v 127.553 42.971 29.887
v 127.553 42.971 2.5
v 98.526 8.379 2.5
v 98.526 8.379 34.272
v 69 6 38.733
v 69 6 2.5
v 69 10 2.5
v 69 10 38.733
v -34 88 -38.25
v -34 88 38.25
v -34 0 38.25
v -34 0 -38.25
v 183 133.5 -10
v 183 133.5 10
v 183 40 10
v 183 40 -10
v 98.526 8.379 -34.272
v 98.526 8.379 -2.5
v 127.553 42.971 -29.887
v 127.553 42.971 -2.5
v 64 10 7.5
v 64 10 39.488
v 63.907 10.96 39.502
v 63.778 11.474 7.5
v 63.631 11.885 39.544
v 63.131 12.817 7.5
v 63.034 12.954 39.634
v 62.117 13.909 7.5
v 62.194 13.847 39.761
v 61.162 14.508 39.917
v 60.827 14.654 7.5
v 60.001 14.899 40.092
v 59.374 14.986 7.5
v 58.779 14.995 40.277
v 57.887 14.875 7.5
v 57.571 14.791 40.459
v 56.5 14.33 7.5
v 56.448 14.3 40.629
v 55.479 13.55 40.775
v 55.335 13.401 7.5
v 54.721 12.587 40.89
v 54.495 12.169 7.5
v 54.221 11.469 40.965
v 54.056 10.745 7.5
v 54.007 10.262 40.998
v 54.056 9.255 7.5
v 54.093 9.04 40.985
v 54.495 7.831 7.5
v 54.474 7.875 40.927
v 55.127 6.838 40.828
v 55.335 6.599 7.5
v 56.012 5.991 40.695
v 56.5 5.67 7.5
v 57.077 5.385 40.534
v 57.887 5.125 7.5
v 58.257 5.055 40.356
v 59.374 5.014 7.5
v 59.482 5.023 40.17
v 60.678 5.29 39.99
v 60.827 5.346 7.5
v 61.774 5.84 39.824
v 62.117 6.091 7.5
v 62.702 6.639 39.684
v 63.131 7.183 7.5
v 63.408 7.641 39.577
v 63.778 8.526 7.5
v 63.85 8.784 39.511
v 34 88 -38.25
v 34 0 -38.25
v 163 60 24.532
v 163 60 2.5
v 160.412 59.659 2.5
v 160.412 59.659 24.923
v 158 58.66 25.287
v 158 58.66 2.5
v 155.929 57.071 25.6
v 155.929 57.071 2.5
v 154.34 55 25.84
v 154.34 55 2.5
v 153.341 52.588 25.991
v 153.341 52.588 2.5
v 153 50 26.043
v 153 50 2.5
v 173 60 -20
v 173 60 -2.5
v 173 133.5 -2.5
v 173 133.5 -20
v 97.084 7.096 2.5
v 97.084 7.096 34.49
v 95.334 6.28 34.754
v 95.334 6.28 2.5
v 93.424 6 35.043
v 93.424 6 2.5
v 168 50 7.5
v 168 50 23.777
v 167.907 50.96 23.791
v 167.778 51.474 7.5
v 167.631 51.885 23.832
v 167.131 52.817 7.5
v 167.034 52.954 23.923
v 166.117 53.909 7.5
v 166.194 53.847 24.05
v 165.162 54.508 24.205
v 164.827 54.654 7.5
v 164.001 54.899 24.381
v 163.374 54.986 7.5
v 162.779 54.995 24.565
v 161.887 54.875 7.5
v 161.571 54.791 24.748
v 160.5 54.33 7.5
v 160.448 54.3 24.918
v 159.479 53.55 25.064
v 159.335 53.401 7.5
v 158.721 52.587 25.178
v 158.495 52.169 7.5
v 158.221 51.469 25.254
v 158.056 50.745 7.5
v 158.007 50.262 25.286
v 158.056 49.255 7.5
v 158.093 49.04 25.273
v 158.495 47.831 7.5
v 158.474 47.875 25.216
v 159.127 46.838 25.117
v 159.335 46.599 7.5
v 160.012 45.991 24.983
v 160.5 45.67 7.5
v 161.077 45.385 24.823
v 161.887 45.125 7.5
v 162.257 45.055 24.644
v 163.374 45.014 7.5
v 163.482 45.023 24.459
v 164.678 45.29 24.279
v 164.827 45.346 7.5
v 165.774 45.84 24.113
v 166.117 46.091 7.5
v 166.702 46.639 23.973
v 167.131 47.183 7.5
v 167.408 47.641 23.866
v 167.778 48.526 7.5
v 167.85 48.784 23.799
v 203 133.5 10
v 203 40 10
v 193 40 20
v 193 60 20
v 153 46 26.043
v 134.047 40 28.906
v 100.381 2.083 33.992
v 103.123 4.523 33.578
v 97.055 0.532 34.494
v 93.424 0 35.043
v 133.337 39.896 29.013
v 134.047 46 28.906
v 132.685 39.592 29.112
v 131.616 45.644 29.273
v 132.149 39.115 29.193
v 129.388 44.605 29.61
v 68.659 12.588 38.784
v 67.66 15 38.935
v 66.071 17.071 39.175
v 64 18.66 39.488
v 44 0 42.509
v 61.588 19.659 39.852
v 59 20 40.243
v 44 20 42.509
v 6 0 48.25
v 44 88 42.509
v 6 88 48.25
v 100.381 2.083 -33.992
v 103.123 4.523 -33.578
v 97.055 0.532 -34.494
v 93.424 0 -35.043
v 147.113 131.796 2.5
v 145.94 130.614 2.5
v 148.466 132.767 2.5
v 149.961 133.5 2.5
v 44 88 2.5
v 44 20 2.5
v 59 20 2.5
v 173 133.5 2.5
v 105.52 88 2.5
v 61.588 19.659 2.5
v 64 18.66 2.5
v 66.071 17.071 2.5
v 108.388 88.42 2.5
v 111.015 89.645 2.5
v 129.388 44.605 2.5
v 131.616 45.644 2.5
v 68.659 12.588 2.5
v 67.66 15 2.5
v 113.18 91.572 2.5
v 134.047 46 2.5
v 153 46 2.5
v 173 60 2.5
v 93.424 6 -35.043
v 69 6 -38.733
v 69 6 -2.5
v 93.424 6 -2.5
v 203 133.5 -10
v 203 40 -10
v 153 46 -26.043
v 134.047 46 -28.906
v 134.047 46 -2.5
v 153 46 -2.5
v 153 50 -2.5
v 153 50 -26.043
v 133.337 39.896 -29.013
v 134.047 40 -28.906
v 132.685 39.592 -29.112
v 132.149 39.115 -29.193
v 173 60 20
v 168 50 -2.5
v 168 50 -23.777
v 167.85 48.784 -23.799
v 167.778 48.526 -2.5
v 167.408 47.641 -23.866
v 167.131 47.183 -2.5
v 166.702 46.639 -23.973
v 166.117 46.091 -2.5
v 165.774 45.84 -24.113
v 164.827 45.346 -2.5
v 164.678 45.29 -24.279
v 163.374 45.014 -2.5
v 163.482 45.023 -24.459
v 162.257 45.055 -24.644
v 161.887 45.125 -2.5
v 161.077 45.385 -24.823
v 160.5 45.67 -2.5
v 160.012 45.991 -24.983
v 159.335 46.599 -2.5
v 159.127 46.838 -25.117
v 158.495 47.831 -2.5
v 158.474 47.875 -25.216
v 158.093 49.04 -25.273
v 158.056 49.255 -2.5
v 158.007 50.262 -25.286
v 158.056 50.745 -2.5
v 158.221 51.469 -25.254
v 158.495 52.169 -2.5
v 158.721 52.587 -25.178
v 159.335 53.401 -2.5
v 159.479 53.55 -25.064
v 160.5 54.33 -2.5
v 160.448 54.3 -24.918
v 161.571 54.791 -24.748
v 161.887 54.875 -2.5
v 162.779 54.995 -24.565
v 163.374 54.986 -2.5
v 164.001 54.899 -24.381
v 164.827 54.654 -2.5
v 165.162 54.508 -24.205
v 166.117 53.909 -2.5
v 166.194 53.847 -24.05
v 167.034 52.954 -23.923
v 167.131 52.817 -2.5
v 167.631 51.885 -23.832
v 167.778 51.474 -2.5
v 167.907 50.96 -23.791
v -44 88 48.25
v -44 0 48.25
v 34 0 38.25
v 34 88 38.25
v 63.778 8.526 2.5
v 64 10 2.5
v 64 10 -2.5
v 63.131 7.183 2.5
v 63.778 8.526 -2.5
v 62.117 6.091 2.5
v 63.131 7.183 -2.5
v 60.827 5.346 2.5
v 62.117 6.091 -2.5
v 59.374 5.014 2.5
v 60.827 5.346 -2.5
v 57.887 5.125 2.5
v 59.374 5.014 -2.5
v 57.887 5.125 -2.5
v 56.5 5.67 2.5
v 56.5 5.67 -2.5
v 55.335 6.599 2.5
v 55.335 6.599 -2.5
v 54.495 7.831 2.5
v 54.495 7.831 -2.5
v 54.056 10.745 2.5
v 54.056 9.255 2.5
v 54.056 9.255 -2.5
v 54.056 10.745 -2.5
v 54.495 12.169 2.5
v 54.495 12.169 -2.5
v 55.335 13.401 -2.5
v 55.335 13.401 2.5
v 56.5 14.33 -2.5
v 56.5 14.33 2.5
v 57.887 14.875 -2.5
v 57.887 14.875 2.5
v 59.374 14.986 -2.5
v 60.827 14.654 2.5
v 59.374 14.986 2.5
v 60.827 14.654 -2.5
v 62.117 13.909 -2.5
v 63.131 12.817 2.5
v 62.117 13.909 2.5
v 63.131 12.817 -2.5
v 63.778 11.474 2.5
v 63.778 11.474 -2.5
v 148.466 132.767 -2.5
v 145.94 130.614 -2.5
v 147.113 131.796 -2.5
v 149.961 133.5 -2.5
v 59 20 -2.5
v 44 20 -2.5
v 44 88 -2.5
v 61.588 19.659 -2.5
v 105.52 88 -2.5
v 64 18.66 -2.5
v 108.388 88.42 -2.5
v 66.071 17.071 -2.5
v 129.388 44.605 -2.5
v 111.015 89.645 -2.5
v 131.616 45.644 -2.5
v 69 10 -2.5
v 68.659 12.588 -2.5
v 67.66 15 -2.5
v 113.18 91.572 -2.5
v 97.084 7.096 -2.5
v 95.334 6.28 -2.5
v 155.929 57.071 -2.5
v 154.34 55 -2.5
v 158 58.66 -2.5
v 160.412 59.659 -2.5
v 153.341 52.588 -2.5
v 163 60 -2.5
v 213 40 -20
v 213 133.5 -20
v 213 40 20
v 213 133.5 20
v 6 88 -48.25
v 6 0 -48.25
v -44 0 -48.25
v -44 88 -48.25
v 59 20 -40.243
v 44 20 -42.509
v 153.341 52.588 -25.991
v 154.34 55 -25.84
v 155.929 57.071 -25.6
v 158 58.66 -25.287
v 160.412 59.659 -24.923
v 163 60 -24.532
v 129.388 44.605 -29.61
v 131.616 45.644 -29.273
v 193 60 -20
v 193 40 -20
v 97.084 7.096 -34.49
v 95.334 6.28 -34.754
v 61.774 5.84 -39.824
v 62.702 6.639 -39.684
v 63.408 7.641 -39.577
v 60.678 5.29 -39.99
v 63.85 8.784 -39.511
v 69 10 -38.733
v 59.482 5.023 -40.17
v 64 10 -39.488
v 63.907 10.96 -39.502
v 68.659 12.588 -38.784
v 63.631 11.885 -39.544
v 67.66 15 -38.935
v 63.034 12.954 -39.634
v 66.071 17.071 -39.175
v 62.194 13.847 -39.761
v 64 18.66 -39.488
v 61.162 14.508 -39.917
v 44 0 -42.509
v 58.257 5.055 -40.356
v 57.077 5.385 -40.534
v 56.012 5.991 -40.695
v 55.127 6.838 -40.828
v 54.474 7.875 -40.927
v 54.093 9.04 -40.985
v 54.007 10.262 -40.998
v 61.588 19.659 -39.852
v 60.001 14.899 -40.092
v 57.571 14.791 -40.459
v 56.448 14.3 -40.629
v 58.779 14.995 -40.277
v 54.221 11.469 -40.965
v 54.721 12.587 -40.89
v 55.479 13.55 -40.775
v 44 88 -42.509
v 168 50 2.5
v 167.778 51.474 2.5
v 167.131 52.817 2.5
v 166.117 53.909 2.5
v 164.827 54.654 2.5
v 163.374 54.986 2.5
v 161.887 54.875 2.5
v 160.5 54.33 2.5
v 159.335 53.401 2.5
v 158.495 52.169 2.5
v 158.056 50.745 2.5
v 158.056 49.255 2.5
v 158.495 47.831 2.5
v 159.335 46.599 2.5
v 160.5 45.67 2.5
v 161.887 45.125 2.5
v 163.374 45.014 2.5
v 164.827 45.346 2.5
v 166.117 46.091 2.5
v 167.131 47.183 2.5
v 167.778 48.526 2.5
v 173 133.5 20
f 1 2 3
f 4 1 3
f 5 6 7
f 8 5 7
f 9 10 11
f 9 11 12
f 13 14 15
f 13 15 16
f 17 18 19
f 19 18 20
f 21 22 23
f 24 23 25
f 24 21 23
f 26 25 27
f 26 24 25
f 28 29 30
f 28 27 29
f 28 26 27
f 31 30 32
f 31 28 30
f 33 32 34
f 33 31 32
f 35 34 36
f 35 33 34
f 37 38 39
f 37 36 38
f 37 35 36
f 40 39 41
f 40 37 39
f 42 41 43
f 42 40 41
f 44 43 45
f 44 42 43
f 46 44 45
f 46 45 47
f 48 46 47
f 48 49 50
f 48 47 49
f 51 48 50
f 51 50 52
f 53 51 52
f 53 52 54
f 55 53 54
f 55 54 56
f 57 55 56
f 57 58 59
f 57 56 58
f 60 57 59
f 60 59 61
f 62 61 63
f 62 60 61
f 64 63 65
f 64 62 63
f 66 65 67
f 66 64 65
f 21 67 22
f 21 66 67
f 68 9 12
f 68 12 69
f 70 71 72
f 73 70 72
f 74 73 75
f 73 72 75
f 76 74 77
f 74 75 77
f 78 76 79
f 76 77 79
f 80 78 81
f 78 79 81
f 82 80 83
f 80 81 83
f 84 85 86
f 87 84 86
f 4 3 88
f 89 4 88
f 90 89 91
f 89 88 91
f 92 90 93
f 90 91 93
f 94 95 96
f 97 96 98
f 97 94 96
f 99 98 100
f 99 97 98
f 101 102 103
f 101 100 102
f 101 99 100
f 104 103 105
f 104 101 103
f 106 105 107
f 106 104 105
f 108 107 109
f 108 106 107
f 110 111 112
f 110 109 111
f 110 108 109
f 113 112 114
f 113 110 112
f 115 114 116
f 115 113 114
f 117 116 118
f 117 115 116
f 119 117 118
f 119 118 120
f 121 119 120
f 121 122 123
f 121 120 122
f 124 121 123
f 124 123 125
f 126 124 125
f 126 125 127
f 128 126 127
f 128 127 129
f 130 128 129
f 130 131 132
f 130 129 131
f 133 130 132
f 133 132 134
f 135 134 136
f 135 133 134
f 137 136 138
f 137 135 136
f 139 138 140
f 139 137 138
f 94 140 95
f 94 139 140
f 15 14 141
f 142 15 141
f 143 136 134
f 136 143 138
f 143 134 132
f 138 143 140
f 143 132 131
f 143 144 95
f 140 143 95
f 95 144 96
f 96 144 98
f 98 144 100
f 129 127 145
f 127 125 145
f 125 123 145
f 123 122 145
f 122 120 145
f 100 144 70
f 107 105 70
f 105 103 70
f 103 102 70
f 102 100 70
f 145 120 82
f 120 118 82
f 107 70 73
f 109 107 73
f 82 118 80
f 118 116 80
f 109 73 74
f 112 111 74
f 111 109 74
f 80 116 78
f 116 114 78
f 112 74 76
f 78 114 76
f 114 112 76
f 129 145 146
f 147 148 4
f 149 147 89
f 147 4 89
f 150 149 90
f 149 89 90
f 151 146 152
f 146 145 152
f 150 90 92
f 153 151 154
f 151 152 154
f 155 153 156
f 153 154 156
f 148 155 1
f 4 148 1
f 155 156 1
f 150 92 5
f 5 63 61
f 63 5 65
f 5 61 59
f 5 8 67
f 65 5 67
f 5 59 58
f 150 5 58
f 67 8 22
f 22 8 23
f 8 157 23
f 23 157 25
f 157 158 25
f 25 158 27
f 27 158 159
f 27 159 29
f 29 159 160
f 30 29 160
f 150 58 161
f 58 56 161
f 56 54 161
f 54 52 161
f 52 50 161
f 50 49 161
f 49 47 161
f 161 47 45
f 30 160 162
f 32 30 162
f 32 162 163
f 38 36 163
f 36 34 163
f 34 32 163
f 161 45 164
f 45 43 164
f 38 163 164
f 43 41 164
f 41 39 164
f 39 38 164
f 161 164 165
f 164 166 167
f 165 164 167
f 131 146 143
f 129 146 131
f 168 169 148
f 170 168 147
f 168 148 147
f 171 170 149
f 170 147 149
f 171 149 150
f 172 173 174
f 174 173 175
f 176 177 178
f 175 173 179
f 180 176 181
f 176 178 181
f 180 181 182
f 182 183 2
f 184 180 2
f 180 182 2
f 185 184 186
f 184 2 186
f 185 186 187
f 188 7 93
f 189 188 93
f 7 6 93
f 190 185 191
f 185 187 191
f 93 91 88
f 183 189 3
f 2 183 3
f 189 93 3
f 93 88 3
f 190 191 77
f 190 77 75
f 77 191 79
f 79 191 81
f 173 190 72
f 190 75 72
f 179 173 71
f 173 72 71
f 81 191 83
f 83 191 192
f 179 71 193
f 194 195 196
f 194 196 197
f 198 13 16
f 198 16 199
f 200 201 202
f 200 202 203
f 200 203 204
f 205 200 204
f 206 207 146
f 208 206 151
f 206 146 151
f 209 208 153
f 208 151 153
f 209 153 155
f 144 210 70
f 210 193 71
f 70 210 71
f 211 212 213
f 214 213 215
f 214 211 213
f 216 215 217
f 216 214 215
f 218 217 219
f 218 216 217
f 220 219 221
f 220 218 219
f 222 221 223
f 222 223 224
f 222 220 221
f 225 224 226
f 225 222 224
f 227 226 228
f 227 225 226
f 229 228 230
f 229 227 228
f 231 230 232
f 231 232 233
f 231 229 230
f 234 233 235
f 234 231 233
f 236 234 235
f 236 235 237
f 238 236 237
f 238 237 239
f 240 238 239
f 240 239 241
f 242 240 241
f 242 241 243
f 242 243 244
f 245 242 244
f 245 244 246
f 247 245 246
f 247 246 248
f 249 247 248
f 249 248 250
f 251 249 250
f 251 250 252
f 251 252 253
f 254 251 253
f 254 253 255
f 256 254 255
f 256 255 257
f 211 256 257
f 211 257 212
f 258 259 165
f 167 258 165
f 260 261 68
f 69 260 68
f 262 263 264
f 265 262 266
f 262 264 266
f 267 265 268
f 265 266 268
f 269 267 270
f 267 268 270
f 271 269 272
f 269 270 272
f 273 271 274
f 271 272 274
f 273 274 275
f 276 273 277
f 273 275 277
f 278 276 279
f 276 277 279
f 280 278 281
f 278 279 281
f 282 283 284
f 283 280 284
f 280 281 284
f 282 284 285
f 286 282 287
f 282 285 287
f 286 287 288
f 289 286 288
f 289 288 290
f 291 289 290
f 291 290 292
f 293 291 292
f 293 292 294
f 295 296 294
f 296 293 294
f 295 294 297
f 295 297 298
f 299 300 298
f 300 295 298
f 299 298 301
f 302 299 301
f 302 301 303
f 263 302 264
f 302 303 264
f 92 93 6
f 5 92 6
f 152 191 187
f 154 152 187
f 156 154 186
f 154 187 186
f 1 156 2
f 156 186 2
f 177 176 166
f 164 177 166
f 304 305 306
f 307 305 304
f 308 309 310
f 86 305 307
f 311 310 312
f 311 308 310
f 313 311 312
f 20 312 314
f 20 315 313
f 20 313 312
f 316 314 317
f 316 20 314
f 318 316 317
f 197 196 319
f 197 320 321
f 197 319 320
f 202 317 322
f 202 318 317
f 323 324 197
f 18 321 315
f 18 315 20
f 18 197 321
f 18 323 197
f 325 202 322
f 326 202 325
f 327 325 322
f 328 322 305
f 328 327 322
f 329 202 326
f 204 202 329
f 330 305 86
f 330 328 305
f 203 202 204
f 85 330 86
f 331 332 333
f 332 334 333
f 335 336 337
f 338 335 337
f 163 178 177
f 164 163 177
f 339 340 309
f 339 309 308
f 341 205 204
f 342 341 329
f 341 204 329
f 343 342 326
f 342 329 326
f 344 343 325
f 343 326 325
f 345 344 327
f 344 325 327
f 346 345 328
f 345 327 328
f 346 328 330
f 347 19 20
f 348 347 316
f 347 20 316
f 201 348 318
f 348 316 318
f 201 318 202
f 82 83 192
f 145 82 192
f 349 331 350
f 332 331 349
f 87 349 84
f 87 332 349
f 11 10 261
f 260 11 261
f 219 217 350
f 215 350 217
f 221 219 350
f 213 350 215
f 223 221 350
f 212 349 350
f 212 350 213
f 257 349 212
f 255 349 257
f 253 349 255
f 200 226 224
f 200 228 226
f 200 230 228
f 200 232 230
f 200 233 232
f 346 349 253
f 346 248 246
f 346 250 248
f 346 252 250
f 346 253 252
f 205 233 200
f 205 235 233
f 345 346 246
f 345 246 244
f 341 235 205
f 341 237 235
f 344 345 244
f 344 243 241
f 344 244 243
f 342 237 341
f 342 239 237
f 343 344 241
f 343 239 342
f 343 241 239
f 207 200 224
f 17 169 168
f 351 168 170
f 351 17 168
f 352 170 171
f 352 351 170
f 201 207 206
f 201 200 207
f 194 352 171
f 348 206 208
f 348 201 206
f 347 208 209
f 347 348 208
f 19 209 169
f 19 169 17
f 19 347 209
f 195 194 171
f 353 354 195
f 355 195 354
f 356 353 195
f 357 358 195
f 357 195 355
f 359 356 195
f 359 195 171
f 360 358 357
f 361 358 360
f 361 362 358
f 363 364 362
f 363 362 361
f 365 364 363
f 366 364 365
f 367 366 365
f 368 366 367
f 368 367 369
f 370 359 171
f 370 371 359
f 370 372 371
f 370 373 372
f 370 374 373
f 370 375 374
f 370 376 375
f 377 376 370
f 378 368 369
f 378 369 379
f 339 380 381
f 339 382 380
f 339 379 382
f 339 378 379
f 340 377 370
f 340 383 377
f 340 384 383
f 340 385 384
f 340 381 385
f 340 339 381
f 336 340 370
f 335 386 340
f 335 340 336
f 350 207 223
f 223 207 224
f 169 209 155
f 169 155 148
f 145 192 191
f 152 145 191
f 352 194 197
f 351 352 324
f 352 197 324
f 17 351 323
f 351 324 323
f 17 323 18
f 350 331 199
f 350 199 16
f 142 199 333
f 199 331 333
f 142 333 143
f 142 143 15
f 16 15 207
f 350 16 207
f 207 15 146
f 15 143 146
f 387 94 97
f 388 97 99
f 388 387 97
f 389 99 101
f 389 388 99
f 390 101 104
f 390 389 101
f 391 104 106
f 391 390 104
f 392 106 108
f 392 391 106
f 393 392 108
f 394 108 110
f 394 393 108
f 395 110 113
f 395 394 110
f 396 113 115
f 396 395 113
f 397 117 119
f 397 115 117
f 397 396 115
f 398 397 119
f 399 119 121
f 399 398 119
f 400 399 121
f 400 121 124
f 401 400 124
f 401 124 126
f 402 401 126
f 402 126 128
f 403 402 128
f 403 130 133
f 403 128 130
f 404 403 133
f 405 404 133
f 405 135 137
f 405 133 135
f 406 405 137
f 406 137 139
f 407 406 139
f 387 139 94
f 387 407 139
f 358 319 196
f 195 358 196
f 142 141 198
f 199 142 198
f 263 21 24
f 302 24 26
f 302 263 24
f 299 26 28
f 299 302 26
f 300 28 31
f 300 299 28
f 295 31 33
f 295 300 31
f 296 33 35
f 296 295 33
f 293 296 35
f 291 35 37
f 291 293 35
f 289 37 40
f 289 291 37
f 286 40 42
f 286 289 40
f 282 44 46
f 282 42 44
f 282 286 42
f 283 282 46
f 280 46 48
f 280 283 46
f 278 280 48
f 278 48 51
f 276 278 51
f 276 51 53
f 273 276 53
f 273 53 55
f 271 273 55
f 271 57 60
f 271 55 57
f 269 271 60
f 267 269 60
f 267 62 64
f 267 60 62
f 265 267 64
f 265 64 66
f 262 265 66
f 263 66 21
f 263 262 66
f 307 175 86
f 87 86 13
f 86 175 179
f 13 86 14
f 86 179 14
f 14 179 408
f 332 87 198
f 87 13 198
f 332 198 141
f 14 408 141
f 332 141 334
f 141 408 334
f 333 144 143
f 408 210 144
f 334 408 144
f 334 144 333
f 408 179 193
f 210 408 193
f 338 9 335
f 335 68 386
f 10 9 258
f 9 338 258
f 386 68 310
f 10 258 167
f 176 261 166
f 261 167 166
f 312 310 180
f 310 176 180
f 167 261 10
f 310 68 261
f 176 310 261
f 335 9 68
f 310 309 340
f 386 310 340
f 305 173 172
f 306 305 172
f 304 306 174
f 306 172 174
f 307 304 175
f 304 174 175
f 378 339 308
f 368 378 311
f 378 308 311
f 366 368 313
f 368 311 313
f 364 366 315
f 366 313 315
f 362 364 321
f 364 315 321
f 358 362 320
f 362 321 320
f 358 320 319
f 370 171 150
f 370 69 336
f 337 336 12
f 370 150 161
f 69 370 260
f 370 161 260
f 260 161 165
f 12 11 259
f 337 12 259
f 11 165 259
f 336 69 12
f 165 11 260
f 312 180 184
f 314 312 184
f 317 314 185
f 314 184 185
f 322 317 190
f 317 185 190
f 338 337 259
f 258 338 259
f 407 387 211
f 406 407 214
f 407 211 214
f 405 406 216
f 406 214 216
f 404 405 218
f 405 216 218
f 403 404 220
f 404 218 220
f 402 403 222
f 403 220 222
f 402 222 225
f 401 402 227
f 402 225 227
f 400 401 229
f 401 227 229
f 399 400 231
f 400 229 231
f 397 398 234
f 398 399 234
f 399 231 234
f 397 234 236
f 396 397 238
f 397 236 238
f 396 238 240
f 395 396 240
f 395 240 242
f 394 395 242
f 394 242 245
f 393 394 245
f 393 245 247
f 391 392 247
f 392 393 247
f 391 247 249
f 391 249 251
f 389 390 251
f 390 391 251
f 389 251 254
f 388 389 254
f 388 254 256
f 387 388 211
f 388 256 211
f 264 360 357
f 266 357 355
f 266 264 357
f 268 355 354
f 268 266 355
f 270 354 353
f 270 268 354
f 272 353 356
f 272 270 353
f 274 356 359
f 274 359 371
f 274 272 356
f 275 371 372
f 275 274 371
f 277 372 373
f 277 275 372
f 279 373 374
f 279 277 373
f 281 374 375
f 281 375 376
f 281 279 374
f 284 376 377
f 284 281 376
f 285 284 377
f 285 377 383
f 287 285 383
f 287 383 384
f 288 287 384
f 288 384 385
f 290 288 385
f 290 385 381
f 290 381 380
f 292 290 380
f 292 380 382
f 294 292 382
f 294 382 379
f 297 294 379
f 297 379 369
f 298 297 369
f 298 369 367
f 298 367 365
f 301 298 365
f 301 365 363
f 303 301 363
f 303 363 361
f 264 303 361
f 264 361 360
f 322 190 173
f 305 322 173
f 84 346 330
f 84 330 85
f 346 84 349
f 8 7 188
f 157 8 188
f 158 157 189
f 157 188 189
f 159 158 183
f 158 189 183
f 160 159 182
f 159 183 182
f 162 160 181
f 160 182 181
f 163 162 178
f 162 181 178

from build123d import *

# Parameters (mm, degrees)
BOSS_EXTRU_3_DEPTH       = 88
ESQUISSE4_W              = 68
ESQUISSE4_H              = 76.5
ENL_V_MAT_EXTRU_1_DEPTH  = 236.459258684
ENL_V_MAT_EXTRU_2_DEPTH  = 68
ENL_V_MAT_EXTRU_5_REACH  = 245.615
ESQUISSE6_W              = 150.690647389
ESQUISSE6_H              = 20
BOSS_EXTRU_5_DEPTH       = 20
ESQUISSE14_W             = 40
ESQUISSE14_H             = 40
ENL_V_MAT_EXTRU_6_DEPTH  = 236.459258684
BOSS_EXTRU_8_DEPTH       = 40
ENL_V_MAT_EXTRU_7_DEPTH  = 236.984242059
ESQUISSE27_W             = 169
ESQUISSE27_H             = 5
BOSS_EXTRU_9_DEPTH       = 45.5
BOSS_EXTRU_10_REACH      = 258.45
ESQUISSE28_R             = 5
ENL_V_MAT_EXTRU_9_DEPTH  = 45.5
BOSS_EXTRU_12_DEPTH      = 17.5
ENL_V_MAT_EXTRU_10_REACH = 248.129
BOSS_EXTRU_13_REACH      = 258.45
ESQUISSE34_R             = 5
BOSS_EXTRU_14_DEPTH      = 17.5
ESQUISSE36_W             = 20
ESQUISSE36_H             = 20
ENL_V_MAT_EXTRU_11_DEPTH = 256.967405152
ESQUISSE42_R             = 5
ENL_V_MAT_EXTRU_16_DEPTH = 10
ESQUISSE43_R             = 5
ENL_V_MAT_EXTRU_17_DEPTH = 10


with BuildPart() as part:
    # Esquisse1 → Boss.-Extru.3 (new body)
    with BuildSketch(Plane(origin=(0, 0, 0), x_dir=(1, 0, 0), z_dir=(0, 1, 0))):
        Polygon((193, 20), (6, 48.25), (-44, 48.25), (-44, -48.25), (6, -48.25), (193, -20), (213, -20), (213, 20), align=None)
    extrude(amount=BOSS_EXTRU_3_DEPTH)

    # Esquisse4 → Enlèv. mat.-Extru.1 (cut, through all)
    with BuildSketch(Plane(origin=(0, 88, 0), x_dir=(1, 0, 0), z_dir=(0, 1, 0))):
        Rectangle(ESQUISSE4_W, ESQUISSE4_H)
    extrude(amount=-ENL_V_MAT_EXTRU_1_DEPTH, mode=Mode.SUBTRACT)

    # Esquisse5 → Enlèv. mat.-Extru.2 (cut)
    with BuildSketch(Plane(origin=(0, 88, 0), x_dir=(1, 0, 0), z_dir=(0, 1, 0))):
        Polygon((193, 20), (173, 20), (173, 2.5), (44, 2.5), (44, 42.509358289), align=None)
        Polygon((173, -20), (193, -20), (44, -42.509358289), (44, -2.5), (173, -2.5), align=None)
    extrude(amount=-ENL_V_MAT_EXTRU_2_DEPTH, mode=Mode.SUBTRACT)

    # Enlèv. mat.-Extru.5: up to this plane
    enl_v_mat_extru_5_end = Plane(origin=(173, 20, 2.5), z_dir=(0, 0, -1))
    # Esquisse6 → Enlèv. mat.-Extru.5 (cut, up to the surface)
    with BuildSketch(Plane(origin=(7.260340781, 0, 48.059600925), x_dir=(0.9887806747234926, 0, -0.14937462064673088), z_dir=(0.14937462064673088, 0, 0.9887806747234927)), mode=Mode.PRIVATE) as enl_v_mat_extru_5_sk1:
        with Locations((112.501854115, 10)):
            Rectangle(ESQUISSE6_W, ESQUISSE6_H)
    enl_v_mat_extru_5_tool1 = split(extrude(enl_v_mat_extru_5_sk1.sketch, amount=-ENL_V_MAT_EXTRU_5_REACH, mode=Mode.PRIVATE), bisect_by=enl_v_mat_extru_5_end, keep=Keep.BOTH, mode=Mode.PRIVATE)
    add(enl_v_mat_extru_5_tool1.solids().sort_by_distance((118.5, 10, 31.254679))[0], mode=Mode.SUBTRACT)

    # Esquisse11 → Boss.-Extru.5 (add)
    with BuildSketch(Plane.XZ.offset(-20)):
        Polygon((37.955805499, 2.5), (44, 2.5), (44, 42.509358289), align=None)
    extrude(amount=BOSS_EXTRU_5_DEPTH)

    # Esquisse14 → Enlèv. mat.-Extru.6 (cut, through all)
    with BuildSketch(Plane(origin=(0, 88, 0), x_dir=(1, 0, 0), z_dir=(0, 1, 0))):
        with Locations((193, 0)):
            Rectangle(ESQUISSE14_W, ESQUISSE14_H)
    extrude(amount=-ENL_V_MAT_EXTRU_6_DEPTH, mode=Mode.SUBTRACT)

    # Esquisse22 → Boss.-Extru.8 (add)
    with BuildSketch(Plane(origin=(173, 0, 0), x_dir=(0, 0, -1), z_dir=(1, 0, 0))):
        Polygon((-2.5, 0), (20, 0), (20, 20), (2.5, 20), (2.5, 88), (-2.5, 88), align=None)
    extrude(amount=BOSS_EXTRU_8_DEPTH)

    # Esquisse23 → Enlèv. mat.-Extru.7 (cut, through all)
    with BuildSketch(Plane.XY.offset(2.5)):
        with BuildLine():
            Line((213, 0), (213, 40))
            Line((213, 40), (193, 40))
            Line((193, 40), (159, 40))
            Line((159, 40), (134.047464579, 40))
            ThreePointArc((134.047464579, 40), (133, 39.767782693), (132.14881397, 39.114644681))
            Line((132.14881397, 39.114644681), (103.122598553, 4.522548178))
            ThreePointArc((103.122598553, 4.522548178), (98.774593016, 1.186206186), (93.423962687, 0))
            Line((93.423962687, 0), (213, 0))
        make_face()
    extrude(amount=-ENL_V_MAT_EXTRU_7_DEPTH, mode=Mode.SUBTRACT)

    # Esquisse27 → Boss.-Extru.9 (add)
    with BuildSketch(Plane(origin=(0, 88, 0), x_dir=(1, 0, 0), z_dir=(0, 1, 0))):
        with Locations((128.5, 0)):
            Rectangle(ESQUISSE27_W, ESQUISSE27_H)
    extrude(amount=BOSS_EXTRU_9_DEPTH)

    # Boss.-Extru.10: up to this plane
    boss_extru_10_end = Plane(origin=(7.260340781, 88, 48.059600925), z_dir=(-0.14937462064673085, 0, -0.9887806747234926))
    # Esquisse28 → Boss.-Extru.10 (add, up to the surface)
    with BuildSketch(Plane.XY.offset(2.5), mode=Mode.PRIVATE) as boss_extru_10_sk1:
        with BuildLine():
            Line((103.122598553, 4.522548178), (132.14881397, 39.114644681))
            ThreePointArc((132.14881397, 39.114644681), (133, 39.767782693), (134.047464579, 40))
            Line((134.047464579, 40), (159, 40))
            Line((159, 40), (193, 40))
            Line((193, 40), (193, 60))
            Line((193, 60), (173, 60))
            Line((173, 60), (163, 60))
            ThreePointArc((163, 60), (155.928932188, 57.071067812), (153, 50))
            Line((153, 50), (153, 46))
            Line((153, 46), (134.047464579, 46))
            ThreePointArc((134.047464579, 46), (130.46429043, 45.205629416), (127.552547311, 42.971370339))
            Line((127.552547311, 42.971370339), (98.526331894, 8.379273836))
            ThreePointArc((98.526331894, 8.379273836), (96.238883445, 6.624052908), (93.423962687, 6))
            Line((93.423962687, 6), (69, 6))
            Line((69, 6), (69, 10))
            ThreePointArc((69, 10), (66.071067812, 17.071067812), (59, 20))
            Line((59, 20), (44, 20))
            Line((44, 20), (44, 0))
            Line((44, 0), (63, 0))
            Line((63, 0), (93.423962687, 0))
            ThreePointArc((93.423962687, 0), (98.774593016, 1.186206186), (103.122598553, 4.522548178))
        make_face()
        with Locations((59, 10)):
            Circle(ESQUISSE28_R, mode=Mode.SUBTRACT)
        with Locations((163, 50)):
            Circle(ESQUISSE28_R, mode=Mode.SUBTRACT)
    boss_extru_10_tool1 = split(extrude(boss_extru_10_sk1.sketch, amount=BOSS_EXTRU_10_REACH, mode=Mode.PRIVATE), bisect_by=boss_extru_10_end, keep=Keep.BOTH, mode=Mode.PRIVATE)
    add(boss_extru_10_tool1.solids().sort_by_distance((124.30992, 30.316725, 2.5))[0])

    # Esquisse29 → Enlèv. mat.-Extru.9 (cut)
    with BuildSketch(Plane.XY.offset(2.5)):
        with BuildLine():
            ThreePointArc((145.939599002, 130.613536933), (147.768845256, 132.309522469), (149.96093833, 133.5))
            Line((149.96093833, 133.5), (44, 133.5))
            Line((44, 133.5), (44, 88))
            Line((44, 88), (105.519519296, 88))
            ThreePointArc((105.519519296, 88), (109.745701914, 88.93692213), (113.179963727, 91.572123903))
            Line((113.179963727, 91.572123903), (145.939599002, 130.613536933))
        make_face()
    extrude(amount=-ENL_V_MAT_EXTRU_9_DEPTH, mode=Mode.SUBTRACT)

    # Esquisse31 → Boss.-Extru.12 (add)
    with BuildSketch(Plane.XY.offset(2.5)):
        Polygon((213, 133.5), (173, 133.5), (173, 60), (193, 60), (193, 40), (213, 40), align=None)
    extrude(amount=BOSS_EXTRU_12_DEPTH)

    # Esquisse33 → Enlèv. mat.-Extru.10 (cut, up to next)
    with BuildSketch(Plane(origin=(0, 20, 0), x_dir=(1, 0, 0), z_dir=(0, 1, 0)), mode=Mode.PRIVATE) as enl_v_mat_extru_10_sk1:
        Polygon((44, 42.509358289), (44, 2.5), (116.109722668, 2.5), (116.109722668, 31.615777191), align=None)
    enl_v_mat_extru_10_tool1 = extrude(enl_v_mat_extru_10_sk1.sketch, amount=-ENL_V_MAT_EXTRU_10_REACH, mode=Mode.PRIVATE) & part.part
    add(enl_v_mat_extru_10_tool1.solids().sort_by_distance((78.160873, 20, -19.924346))[0], mode=Mode.SUBTRACT)

    # Boss.-Extru.13: up to this plane
    boss_extru_13_end = Plane(origin=(7.260340781, 88, -48.059600925), z_dir=(0.14937462064673085, 0, -0.9887806747234926))
    # Esquisse34 → Boss.-Extru.13 (add, up to the surface)
    with BuildSketch(Plane(origin=(0, 0, -2.5), x_dir=(-1, 0, 0), z_dir=(0, 0, -1)), mode=Mode.PRIVATE) as boss_extru_13_sk1:
        with BuildLine():
            Line((-44, 0), (-44, 20))
            Line((-44, 20), (-59, 20))
            ThreePointArc((-59, 20), (-66.071067812, 17.071067812), (-69, 10))
            Line((-69, 10), (-69, 6))
            Line((-69, 6), (-93.423962687, 6))
            ThreePointArc((-93.423962687, 6), (-96.238883445, 6.624052908), (-98.526331894, 8.379273836))
            Line((-98.526331894, 8.379273836), (-127.552547311, 42.971370339))
            ThreePointArc((-127.552547311, 42.971370339), (-130.46429043, 45.205629416), (-134.047464579, 46))
            Line((-134.047464579, 46), (-153, 46))
            Line((-153, 46), (-153, 50))
            ThreePointArc((-153, 50), (-155.928932188, 57.071067812), (-163, 60))
            Line((-163, 60), (-173, 60))
            Line((-173, 60), (-193, 60))
            Line((-193, 60), (-193, 40))
            Line((-193, 40), (-159, 40))
            Line((-159, 40), (-134.047464579, 40))
            ThreePointArc((-134.047464579, 40), (-133, 39.767782693), (-132.14881397, 39.114644681))
            Line((-132.14881397, 39.114644681), (-103.122598553, 4.522548178))
            ThreePointArc((-103.122598553, 4.522548178), (-98.774593016, 1.186206186), (-93.423962687, 0))
            Line((-93.423962687, 0), (-63, 0))
            Line((-63, 0), (-44, 0))
        make_face()
        with Locations(Location((-163, 50, 0), (0, 0, 180))):
            Circle(ESQUISSE34_R, mode=Mode.SUBTRACT)
        with Locations(Location((-59, 10, 0), (0, 0, 180))):
            Circle(ESQUISSE34_R, mode=Mode.SUBTRACT)
    boss_extru_13_tool1 = split(extrude(boss_extru_13_sk1.sketch, amount=BOSS_EXTRU_13_REACH, mode=Mode.PRIVATE), bisect_by=boss_extru_13_end, keep=Keep.BOTH, mode=Mode.PRIVATE)
    add(boss_extru_13_tool1.solids().sort_by_distance((124.30992, 30.316725, -2.5))[0])

    # Esquisse35 → Boss.-Extru.14 (add)
    with BuildSketch(Plane(origin=(0, 0, -2.5), x_dir=(-1, 0, 0), z_dir=(0, 0, -1))):
        Polygon((-173, 60), (-173, 133.5), (-213, 133.5), (-213, 40), (-193, 40), (-193, 60), align=None)
    extrude(amount=BOSS_EXTRU_14_DEPTH)

    # Esquisse36 → Enlèv. mat.-Extru.11 (cut, through all)
    with BuildSketch(Plane(origin=(0, 133.5, 0), x_dir=(1, 0, 0), z_dir=(0, 1, 0))):
        with Locations((193, 0)):
            Rectangle(ESQUISSE36_W, ESQUISSE36_H)
    extrude(amount=-ENL_V_MAT_EXTRU_11_DEPTH, mode=Mode.SUBTRACT)

    # Esquisse42 → Enlèv. mat.-Extru.16 (cut)
    with BuildSketch(Plane(origin=(0, 0, -2.5), x_dir=(-1, 0, 0), z_dir=(0, 0, -1))):
        with Locations(Location((-59, 10, 0), (0, 0, 180))):
            Circle(ESQUISSE42_R)
    extrude(amount=-ENL_V_MAT_EXTRU_16_DEPTH, mode=Mode.SUBTRACT)

    # Esquisse43 → Enlèv. mat.-Extru.17 (cut)
    with BuildSketch(Plane(origin=(0, 0, -2.5), x_dir=(-1, 0, 0), z_dir=(0, 0, -1))):
        with Locations(Location((-163, 50, 0), (0, 0, 180))):
            Circle(ESQUISSE43_R)
    extrude(amount=-ENL_V_MAT_EXTRU_17_DEPTH, mode=Mode.SUBTRACT)


solid = part.part
